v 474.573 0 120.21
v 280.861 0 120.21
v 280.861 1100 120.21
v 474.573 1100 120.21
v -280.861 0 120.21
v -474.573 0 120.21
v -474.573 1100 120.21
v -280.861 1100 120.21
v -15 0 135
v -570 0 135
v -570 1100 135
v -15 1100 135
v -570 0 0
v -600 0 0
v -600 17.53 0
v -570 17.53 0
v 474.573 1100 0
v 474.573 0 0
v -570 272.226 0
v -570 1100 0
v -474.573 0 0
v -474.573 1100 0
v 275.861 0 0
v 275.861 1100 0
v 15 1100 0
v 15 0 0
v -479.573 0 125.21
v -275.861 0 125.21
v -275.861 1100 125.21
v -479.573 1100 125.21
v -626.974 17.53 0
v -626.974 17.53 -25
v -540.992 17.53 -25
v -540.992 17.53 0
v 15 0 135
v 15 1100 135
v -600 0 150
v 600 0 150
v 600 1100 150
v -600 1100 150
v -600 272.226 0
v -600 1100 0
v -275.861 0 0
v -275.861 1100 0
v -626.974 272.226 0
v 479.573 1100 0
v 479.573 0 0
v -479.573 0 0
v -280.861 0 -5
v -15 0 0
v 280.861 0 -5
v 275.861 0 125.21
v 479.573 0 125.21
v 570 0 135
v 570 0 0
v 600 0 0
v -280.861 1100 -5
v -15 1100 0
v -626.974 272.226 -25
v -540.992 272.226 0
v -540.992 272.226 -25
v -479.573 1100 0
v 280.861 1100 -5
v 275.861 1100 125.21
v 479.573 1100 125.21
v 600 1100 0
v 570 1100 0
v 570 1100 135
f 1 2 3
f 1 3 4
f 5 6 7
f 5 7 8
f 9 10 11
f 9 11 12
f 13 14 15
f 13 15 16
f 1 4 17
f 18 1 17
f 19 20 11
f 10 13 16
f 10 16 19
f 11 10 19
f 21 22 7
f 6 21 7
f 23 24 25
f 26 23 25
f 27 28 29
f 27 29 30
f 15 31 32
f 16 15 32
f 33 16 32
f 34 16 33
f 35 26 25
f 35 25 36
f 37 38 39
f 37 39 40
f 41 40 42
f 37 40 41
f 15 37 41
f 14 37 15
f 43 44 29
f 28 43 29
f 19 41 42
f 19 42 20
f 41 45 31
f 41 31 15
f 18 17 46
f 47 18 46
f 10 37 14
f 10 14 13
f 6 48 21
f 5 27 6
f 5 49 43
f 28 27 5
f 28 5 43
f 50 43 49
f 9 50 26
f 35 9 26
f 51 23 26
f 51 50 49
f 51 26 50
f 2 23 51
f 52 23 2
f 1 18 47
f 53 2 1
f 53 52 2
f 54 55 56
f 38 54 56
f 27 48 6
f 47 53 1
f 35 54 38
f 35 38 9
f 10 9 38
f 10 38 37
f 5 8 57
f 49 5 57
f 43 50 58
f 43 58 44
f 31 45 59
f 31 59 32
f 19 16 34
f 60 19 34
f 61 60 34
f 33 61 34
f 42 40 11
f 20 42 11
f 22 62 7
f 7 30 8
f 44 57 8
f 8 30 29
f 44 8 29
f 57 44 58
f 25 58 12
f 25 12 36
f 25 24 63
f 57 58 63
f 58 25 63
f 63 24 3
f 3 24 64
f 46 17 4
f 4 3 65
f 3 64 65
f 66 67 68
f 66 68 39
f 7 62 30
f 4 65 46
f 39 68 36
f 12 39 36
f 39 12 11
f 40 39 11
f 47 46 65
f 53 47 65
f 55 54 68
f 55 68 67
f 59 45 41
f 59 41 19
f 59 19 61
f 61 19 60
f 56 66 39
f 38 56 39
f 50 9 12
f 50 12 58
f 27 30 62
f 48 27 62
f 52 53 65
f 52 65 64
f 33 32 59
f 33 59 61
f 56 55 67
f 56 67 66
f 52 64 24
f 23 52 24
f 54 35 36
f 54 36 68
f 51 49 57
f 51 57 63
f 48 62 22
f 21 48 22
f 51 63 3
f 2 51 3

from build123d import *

# Parameters (mm, degrees)
F1_DEPTH = 1100
F3_DEPTH = 1100
F4_W     = 85.982085
F4_H     = 254.69566
F5_DEPTH = 25


with BuildPart() as f1:
    # F0 (on Front) → F1 (new body)
    with BuildSketch(Plane.XZ):
        Polygon((600, 150), (0, 150), (0, 0), (15, 0), (15, 135), (570, 135), (570, 0), (600, 0), align=None)
        Polygon((0, 0), (0, 150), (-600, 150), (-600, 0), (-570, 0), (-570, 135), (-15, 135), (-15, 0), align=None)
    extrude(amount=-F1_DEPTH)

    # F2 (on Front) → F3 (join)
    with BuildSketch(Plane.XZ):
        Polygon((0, -5), (0, 0), (-275.860757, 0), (-275.860757, 125.209585), (-479.573339, 125.209585), (-479.573339, 0), (-474.573339, 0), (-474.573339, 120.209585), (-280.860757, 120.209585), (-280.860757, -5), align=None)
        Polygon((474.573339, 0), (479.573339, 0), (479.573339, 125.209585), (275.860757, 125.209585), (275.860757, 0), (0, 0), (0, -5), (280.860757, -5), (280.860757, 120.209585), (474.573339, 120.209585), align=None)
    extrude(amount=-F3_DEPTH)

    # F4 (on face) → F5 (join)
    with BuildSketch(Plane(origin=(0, 0, 0), x_dir=(1, 0, 0), z_dir=(0, 0, -1))):
        with Locations((-583.983242, -144.877729)):
            Rectangle(F4_W, F4_H)
    extrude(amount=F5_DEPTH)


solid = f1.part
